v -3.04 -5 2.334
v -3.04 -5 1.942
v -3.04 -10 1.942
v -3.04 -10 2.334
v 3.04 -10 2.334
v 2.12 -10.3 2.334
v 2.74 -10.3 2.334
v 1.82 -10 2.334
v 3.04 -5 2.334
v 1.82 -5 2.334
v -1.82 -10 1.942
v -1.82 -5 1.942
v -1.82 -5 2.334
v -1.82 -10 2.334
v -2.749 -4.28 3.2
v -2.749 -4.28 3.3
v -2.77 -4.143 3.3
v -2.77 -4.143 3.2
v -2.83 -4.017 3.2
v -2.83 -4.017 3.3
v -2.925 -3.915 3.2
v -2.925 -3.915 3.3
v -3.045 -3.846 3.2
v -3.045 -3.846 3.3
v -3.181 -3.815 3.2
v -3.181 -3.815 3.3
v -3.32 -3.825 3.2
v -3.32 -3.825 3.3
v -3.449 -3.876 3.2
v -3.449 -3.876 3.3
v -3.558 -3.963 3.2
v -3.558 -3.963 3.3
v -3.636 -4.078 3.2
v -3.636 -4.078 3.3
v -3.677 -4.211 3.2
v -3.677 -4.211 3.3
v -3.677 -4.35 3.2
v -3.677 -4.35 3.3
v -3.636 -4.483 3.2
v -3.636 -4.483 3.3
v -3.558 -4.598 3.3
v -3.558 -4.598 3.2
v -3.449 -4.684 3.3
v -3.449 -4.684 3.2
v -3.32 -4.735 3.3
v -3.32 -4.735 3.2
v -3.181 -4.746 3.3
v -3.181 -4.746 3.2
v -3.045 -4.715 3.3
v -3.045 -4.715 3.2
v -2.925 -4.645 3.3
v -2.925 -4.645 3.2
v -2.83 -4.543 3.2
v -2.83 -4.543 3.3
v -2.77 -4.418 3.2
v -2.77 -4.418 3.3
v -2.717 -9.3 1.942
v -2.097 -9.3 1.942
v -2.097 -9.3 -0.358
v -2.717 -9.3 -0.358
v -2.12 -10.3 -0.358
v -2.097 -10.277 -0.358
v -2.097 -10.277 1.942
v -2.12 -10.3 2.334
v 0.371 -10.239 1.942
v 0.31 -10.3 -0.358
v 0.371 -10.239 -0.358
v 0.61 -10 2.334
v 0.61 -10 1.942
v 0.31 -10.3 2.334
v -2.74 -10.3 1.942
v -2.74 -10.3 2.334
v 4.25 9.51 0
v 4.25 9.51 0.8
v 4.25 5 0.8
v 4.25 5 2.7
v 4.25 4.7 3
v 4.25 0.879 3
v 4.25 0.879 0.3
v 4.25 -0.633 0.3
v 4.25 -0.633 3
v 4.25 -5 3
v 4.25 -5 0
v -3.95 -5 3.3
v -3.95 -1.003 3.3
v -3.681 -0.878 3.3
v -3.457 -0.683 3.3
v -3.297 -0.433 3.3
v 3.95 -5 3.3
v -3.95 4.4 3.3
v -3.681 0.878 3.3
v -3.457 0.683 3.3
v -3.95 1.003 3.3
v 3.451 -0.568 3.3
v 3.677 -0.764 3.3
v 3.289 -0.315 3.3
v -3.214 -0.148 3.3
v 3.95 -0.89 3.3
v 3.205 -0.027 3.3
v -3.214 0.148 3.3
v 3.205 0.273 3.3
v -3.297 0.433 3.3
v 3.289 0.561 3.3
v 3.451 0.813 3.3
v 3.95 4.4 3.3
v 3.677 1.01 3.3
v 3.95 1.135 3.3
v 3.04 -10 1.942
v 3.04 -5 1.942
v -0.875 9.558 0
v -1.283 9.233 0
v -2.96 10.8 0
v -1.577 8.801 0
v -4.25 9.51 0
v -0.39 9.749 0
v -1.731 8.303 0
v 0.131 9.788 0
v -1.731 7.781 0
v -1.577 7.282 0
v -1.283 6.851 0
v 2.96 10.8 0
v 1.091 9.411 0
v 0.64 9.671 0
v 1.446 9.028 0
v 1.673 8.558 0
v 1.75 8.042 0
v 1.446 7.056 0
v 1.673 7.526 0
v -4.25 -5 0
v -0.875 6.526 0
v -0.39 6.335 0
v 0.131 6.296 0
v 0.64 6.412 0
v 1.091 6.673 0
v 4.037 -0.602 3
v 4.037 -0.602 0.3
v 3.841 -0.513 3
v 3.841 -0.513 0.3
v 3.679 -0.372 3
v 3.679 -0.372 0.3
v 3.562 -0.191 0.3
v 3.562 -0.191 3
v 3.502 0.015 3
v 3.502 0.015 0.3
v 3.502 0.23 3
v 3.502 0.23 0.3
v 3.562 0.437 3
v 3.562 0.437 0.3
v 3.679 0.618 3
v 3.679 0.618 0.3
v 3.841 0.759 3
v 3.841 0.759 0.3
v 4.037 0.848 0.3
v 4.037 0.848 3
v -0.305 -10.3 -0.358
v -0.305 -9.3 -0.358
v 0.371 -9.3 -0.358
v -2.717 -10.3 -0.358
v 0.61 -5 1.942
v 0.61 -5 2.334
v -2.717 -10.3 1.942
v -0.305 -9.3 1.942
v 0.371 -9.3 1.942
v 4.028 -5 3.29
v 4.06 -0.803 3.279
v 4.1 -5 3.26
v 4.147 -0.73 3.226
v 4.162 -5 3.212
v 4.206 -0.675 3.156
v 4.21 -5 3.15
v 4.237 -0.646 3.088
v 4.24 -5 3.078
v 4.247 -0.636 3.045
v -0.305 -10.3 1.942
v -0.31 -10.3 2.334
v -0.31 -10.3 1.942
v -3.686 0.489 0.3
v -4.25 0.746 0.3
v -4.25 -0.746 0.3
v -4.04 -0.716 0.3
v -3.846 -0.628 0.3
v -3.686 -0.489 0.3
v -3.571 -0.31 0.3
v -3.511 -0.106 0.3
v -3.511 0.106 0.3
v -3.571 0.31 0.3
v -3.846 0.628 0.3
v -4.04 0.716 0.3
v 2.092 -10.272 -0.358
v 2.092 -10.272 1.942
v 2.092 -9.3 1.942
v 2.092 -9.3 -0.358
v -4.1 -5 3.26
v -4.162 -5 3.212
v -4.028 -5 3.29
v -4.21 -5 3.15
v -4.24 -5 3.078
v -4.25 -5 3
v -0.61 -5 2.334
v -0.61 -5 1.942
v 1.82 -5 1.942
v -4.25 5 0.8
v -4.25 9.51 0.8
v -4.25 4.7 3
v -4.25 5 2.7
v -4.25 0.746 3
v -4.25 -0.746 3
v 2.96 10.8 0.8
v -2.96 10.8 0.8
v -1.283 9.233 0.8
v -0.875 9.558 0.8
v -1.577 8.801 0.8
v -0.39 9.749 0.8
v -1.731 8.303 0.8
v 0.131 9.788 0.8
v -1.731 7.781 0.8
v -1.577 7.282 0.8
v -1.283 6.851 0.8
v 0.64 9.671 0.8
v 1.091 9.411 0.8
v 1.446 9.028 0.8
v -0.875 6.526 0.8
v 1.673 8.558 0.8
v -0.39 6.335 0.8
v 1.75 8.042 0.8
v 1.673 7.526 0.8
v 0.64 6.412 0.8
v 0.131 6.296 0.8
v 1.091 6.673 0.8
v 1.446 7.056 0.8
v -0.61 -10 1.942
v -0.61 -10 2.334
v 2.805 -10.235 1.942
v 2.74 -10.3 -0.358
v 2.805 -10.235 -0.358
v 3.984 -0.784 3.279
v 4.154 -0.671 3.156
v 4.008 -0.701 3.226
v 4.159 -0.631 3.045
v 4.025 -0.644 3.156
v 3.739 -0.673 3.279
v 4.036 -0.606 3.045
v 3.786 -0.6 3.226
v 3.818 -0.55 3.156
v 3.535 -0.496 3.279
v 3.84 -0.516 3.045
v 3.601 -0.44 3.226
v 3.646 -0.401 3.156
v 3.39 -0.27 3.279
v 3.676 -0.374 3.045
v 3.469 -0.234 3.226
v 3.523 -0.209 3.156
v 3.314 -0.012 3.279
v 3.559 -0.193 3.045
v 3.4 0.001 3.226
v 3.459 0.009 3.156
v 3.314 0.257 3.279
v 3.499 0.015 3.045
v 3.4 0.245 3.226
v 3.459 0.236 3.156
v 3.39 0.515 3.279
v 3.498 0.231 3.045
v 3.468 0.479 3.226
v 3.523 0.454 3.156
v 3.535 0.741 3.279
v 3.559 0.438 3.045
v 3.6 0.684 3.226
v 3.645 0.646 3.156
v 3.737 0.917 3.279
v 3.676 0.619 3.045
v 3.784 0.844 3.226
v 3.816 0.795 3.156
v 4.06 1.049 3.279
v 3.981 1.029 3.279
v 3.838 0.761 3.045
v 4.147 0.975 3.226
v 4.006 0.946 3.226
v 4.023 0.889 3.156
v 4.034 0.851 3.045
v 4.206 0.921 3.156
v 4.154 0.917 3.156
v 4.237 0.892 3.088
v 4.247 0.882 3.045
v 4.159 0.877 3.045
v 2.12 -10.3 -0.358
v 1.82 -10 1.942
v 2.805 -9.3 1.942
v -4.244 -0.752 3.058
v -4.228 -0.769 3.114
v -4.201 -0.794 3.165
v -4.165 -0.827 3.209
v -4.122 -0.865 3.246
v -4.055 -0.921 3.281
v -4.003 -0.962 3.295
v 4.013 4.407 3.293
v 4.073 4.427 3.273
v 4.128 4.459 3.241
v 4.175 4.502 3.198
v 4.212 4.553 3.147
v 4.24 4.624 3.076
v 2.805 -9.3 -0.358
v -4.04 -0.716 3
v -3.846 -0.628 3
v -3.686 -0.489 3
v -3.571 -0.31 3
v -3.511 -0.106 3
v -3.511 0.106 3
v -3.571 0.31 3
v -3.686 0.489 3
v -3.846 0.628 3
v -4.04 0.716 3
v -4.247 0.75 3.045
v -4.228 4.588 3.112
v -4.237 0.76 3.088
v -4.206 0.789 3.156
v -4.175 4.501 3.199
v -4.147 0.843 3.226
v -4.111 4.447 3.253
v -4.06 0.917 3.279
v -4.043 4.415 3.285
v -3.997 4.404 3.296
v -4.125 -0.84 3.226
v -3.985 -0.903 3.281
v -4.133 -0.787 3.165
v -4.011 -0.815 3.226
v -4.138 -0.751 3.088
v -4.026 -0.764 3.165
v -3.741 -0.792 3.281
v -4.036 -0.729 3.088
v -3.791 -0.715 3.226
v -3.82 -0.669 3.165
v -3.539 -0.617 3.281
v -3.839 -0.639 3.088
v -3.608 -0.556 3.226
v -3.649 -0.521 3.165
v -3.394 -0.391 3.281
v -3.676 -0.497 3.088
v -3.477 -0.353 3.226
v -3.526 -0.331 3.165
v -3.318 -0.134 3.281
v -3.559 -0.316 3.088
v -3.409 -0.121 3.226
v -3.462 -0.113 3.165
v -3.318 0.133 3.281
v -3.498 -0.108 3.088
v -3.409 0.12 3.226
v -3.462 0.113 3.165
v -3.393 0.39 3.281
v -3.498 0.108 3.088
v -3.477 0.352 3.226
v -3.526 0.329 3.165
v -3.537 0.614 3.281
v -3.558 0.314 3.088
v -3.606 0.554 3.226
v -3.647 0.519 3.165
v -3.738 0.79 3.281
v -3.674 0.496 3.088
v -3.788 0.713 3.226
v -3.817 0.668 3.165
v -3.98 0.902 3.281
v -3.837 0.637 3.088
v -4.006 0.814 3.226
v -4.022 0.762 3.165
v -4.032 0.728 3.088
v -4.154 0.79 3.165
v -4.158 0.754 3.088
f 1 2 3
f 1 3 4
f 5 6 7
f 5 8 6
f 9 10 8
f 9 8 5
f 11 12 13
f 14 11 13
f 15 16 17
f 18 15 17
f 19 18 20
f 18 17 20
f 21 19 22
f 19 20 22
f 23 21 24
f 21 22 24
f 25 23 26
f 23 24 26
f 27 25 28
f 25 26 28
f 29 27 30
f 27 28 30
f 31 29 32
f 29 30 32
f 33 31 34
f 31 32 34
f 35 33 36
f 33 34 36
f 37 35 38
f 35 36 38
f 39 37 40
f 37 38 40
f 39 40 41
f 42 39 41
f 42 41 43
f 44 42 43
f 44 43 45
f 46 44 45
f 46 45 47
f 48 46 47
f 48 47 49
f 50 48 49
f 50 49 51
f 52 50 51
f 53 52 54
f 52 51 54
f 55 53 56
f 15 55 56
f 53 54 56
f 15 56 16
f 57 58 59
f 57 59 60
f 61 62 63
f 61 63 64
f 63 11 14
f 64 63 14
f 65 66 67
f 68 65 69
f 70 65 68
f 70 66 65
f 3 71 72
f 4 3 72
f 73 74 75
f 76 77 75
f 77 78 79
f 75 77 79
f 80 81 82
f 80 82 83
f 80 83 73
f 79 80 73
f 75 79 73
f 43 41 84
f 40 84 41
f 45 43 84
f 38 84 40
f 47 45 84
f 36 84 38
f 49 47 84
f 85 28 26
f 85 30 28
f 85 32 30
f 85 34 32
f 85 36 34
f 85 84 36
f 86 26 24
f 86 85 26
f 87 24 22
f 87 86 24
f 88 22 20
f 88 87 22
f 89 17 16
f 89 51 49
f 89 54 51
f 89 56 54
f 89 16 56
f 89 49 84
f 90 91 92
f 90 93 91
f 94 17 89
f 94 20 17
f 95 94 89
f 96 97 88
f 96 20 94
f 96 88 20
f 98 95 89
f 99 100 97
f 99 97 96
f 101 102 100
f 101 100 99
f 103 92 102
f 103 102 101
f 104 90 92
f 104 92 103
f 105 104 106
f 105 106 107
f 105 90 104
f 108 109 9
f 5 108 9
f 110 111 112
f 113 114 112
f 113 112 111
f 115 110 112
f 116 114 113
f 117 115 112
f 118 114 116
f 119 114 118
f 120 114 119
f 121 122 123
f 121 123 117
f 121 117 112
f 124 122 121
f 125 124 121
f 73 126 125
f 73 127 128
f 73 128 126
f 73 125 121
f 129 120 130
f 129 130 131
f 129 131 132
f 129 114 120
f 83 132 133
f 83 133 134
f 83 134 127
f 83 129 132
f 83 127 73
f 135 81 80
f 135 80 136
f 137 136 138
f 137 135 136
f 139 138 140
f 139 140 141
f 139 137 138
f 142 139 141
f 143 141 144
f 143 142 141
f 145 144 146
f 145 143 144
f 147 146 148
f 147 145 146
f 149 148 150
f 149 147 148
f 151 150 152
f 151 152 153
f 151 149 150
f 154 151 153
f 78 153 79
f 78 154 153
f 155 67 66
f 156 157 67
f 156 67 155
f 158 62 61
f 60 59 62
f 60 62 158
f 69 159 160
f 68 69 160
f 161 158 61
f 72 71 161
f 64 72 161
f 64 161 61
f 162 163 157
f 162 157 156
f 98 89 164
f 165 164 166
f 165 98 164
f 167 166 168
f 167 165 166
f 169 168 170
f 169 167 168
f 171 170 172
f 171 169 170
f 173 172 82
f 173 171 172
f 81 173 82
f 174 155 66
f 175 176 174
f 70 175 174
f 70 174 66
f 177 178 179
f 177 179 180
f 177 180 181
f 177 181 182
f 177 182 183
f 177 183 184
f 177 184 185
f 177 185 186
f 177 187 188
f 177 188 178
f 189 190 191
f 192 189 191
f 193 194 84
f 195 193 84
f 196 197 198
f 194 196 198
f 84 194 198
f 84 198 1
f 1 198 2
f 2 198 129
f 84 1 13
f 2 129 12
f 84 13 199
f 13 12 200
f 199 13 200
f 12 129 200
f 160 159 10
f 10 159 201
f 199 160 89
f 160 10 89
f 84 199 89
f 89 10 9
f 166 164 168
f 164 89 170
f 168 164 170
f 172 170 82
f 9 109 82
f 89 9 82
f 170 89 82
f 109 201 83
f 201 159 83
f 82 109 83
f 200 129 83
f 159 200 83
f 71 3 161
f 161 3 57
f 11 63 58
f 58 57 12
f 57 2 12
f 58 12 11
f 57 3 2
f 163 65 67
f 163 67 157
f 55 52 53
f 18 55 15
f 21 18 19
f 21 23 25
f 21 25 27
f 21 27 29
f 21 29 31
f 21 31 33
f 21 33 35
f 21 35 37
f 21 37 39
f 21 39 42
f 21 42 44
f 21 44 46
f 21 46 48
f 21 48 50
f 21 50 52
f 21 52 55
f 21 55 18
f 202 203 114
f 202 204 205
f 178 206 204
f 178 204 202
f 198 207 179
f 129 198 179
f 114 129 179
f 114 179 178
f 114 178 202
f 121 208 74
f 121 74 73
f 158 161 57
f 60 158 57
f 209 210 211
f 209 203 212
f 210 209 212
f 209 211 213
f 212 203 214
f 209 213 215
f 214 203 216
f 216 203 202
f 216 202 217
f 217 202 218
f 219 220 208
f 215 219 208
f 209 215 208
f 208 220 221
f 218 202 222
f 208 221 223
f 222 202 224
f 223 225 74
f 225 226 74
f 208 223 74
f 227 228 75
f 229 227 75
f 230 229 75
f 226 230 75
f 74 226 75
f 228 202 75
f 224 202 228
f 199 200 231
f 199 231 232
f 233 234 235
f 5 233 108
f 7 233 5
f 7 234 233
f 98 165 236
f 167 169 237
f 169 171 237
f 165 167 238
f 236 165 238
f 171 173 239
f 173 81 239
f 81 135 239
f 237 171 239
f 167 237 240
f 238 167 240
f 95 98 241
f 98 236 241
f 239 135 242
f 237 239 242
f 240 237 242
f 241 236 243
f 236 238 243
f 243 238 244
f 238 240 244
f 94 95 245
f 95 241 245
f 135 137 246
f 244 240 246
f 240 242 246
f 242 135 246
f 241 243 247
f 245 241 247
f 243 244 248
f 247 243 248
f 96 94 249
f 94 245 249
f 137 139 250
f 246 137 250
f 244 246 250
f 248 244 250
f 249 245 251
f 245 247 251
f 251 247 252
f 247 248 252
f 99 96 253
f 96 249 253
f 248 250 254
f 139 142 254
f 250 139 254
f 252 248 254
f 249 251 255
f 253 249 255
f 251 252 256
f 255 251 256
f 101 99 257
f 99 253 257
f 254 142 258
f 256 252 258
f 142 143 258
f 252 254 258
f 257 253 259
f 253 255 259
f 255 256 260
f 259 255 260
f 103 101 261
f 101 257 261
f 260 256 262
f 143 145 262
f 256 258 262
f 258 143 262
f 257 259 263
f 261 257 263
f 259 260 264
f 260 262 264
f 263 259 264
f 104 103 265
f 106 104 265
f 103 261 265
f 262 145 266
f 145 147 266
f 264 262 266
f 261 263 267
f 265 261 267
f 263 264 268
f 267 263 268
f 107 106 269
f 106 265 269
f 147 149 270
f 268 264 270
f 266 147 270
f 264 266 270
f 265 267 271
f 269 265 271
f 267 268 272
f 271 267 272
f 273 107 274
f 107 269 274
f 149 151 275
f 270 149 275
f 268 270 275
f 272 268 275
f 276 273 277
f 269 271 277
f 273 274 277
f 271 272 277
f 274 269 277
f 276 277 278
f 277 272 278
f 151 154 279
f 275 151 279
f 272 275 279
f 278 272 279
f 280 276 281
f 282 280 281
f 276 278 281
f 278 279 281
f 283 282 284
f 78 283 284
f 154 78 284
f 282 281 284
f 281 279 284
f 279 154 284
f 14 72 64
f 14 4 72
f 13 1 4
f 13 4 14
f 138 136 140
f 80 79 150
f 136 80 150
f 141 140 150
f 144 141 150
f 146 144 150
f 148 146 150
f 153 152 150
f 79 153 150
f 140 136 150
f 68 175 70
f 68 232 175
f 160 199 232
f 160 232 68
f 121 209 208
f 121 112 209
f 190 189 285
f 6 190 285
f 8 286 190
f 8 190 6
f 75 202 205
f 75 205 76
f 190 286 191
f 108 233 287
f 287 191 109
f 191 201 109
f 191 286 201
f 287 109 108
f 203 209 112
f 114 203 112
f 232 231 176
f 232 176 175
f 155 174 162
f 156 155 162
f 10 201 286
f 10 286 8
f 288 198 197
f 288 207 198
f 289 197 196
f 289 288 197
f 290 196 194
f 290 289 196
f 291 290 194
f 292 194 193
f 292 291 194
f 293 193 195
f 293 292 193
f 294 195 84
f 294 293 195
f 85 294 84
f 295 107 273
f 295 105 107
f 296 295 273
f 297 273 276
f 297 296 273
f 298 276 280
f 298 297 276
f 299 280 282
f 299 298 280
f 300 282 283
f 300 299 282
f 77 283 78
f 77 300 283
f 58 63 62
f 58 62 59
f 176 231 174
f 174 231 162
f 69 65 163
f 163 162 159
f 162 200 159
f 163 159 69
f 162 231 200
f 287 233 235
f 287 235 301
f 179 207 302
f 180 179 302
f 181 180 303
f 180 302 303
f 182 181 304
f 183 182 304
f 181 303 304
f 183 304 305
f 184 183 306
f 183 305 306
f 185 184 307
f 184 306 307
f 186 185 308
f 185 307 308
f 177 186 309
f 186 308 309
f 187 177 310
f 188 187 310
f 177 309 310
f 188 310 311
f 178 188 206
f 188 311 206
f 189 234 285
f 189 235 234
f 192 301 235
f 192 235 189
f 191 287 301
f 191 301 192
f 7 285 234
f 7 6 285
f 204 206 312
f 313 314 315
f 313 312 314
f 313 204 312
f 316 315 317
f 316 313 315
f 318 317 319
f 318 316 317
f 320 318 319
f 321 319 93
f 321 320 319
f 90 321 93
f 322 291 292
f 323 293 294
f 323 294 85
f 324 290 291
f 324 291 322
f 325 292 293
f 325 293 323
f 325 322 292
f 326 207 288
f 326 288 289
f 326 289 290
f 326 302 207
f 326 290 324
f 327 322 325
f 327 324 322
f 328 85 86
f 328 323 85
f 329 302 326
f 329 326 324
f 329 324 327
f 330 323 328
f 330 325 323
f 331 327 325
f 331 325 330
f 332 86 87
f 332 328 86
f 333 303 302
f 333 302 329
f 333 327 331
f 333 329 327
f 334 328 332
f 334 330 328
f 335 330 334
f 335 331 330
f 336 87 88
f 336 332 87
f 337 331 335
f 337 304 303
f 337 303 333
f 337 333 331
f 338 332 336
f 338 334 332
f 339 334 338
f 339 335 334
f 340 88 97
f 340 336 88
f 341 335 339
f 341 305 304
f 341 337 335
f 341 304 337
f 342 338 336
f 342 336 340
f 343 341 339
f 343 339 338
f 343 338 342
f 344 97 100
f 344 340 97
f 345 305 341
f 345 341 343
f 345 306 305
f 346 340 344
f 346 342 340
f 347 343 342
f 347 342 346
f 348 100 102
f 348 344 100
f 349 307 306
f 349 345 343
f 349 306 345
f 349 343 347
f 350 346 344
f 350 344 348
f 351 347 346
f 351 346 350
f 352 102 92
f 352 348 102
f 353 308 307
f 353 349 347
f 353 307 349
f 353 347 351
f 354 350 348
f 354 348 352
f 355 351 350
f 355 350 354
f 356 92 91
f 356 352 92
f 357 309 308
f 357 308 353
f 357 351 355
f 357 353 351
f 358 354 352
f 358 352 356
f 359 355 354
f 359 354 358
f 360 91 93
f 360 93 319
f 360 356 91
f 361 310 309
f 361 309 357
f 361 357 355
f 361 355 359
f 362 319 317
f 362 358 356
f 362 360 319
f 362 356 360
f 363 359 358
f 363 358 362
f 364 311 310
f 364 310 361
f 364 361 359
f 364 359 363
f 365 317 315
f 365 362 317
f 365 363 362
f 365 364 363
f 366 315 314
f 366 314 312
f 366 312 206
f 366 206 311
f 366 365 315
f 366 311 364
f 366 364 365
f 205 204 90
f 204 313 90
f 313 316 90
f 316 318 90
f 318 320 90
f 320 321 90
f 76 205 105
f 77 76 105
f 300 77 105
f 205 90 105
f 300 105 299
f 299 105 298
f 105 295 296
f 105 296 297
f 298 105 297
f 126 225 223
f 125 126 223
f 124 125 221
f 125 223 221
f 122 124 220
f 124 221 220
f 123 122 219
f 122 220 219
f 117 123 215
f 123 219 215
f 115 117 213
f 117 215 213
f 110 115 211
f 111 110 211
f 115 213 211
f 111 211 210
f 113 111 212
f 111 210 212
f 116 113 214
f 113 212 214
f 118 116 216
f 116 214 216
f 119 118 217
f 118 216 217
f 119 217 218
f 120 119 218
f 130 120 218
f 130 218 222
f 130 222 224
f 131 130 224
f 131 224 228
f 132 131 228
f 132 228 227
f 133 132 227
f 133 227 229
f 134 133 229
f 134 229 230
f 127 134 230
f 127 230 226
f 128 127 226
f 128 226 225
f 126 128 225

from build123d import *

# Parameters (mm, degrees)
CROQUIS1_W              = 8.5
CROQUIS1_H              = 10
SALIENTE_EXTRUIR1_DEPTH = 3.3
CROQUIS2_R              = 0.466725864
CORTAR_EXTRUIR1_DEPTH   = 0.1
CORTAR_EXTRUIR2_DEPTH   = 3
CORTAR_EXTRUIR3_DEPTH   = 3
CHAFL_N1_SIZE           = 0.6
REDONDEO1_R             = 0.3
CROQUIS5_W              = 8.5
CROQUIS5_H              = 0.8
SALIENTE_EXTRUIR2_DEPTH = 5.8
CROQUIS6_R              = 1.750484279
CORTAR_EXTRUIR4_DEPTH   = 5.8
CROQUIS7_W              = 1.22
CROQUIS7_H              = 0.3917794
SALIENTE_EXTRUIR3_DEPTH = 5.3
CROQUIS8_W              = 1.22
CROQUIS8_H              = 0.3917794
SALIENTE_EXTRUIR4_DEPTH = 5.3
CROQUIS9_W              = 0.675717965
CROQUIS9_H              = 1
CROQUIS9_W_2            = 0.619737604
CROQUIS9_W_3            = 0.713804918
SALIENTE_EXTRUIR5_DEPTH = 2.3
CHAFL_N2_SIZE           = 0.3
CHAFL_N3_SIZE           = 0.3
CHAFL_N4_SIZE           = 0.3
CHAFL_N5_SIZE           = 0.3
CHAFL_N6_SIZE           = 0.3
CHAFL_N7_SIZE           = 0.3
CHAFL_N8_SIZE           = 1.29
CHAFL_N9_SIZE           = 1.29


with BuildPart() as part:
    # Croquis1 → Saliente-Extruir1 (new body)
    with BuildSketch(Plane.XY):
        Rectangle(CROQUIS1_W, CROQUIS1_H)
    extrude(amount=SALIENTE_EXTRUIR1_DEPTH)

    # Croquis2 → Cortar-Extruir1 (cut)
    with BuildSketch(Plane.XY.offset(3.3)):
        with Locations((-3.215855375, -4.280210789)):
            Circle(CROQUIS2_R)
    extrude(amount=-CORTAR_EXTRUIR1_DEPTH, mode=Mode.SUBTRACT)

    # Croquis3 → Cortar-Extruir2 (cut)
    with BuildSketch(Plane.XY.offset(3.3)):
        with BuildLine():
            Line((-4.25, 0.746438526), (-4.25, -0.746438526))
            ThreePointArc((-4.25, -0.746438526), (-3.503561474, 0), (-4.25, 0.746438526))
        make_face()
    extrude(amount=-CORTAR_EXTRUIR2_DEPTH, mode=Mode.SUBTRACT)

    # Croquis4 → Cortar-Extruir3 (cut)
    with BuildSketch(Plane.XY.offset(3.3)):
        with BuildLine():
            Line((4.25, 0.878718771), (4.25, -0.633055459))
            ThreePointArc((4.25, -0.633055459), (3.494112885, 0.122831656), (4.25, 0.878718771))
        make_face()
    extrude(amount=-CORTAR_EXTRUIR3_DEPTH, mode=Mode.SUBTRACT)

    # Chaflán1
    chafl_n1_edges = [part.edges().sort_by_distance(p)[0] for p in [
        (0, 5, 3.3),
    ]]
    chamfer(chafl_n1_edges, length=CHAFL_N1_SIZE)

    # Redondeo1
    redondeo1_edges = [part.edges().sort_by_distance(p)[0] for p in [
        (4.25, -2.816527729, 3.3),
        (-4.25, -2.873219263, 3.3),
        (-3.503561474, 0, 3.3),
        (4.25, 2.639359386, 3.3),
        (3.494112885, 0.122831656, 3.3),
        (-4.25, 2.573219263, 3.3),
    ]]
    fillet(redondeo1_edges, radius=REDONDEO1_R)

    # Croquis5 → Saliente-Extruir2 (add)
    with BuildSketch(Plane(origin=(0, 5, 0), x_dir=(1, 0, 0), z_dir=(0, 1, 0))):
        with Locations((0, -0.4)):
            Rectangle(CROQUIS5_W, CROQUIS5_H)
    extrude(amount=SALIENTE_EXTRUIR2_DEPTH)

    # Croquis6 → Cortar-Extruir4 (cut)
    with BuildSketch(Plane.XY.offset(0.8)):
        with Locations((0, 8.041970686)):
            Circle(CROQUIS6_R)
    extrude(amount=-CORTAR_EXTRUIR4_DEPTH, mode=Mode.SUBTRACT)

    # Croquis7 → Saliente-Extruir3 (add)
    with BuildSketch(Plane.XZ.offset(5)):
        with Locations((0, 2.138324213)):
            Rectangle(CROQUIS7_W, CROQUIS7_H)
    extrude(amount=SALIENTE_EXTRUIR3_DEPTH)

    # Croquis8 → Saliente-Extruir4 (add)
    with BuildSketch(Plane.XZ.offset(5)):
        with Locations((2.43, 2.138324213)):
            Rectangle(CROQUIS8_W, CROQUIS8_H)
        with Locations((-2.43, 2.138324213)):
            Rectangle(CROQUIS8_W, CROQUIS8_H)
    extrude(amount=SALIENTE_EXTRUIR4_DEPTH)

    # Croquis9 → Saliente-Extruir5 (add)
    with BuildSketch(Plane(origin=(0, 0, 1.942434513), x_dir=(-1, 0, 0), z_dir=(0, 0, -1))):
        with Locations((-0.032858983, -9.8)):
            Rectangle(CROQUIS9_W, CROQUIS9_H)
        with Locations((2.407034508, -9.8)):
            Rectangle(CROQUIS9_W_2, CROQUIS9_H)
        with Locations((-2.448498949, -9.8)):
            Rectangle(CROQUIS9_W_3, CROQUIS9_H)
    extrude(amount=SALIENTE_EXTRUIR5_DEPTH)

    # Chaflán2
    chafl_n2_edges = [part.edges().sort_by_distance(p)[0] for p in [
        (3.04, -10.3, 2.138324213),
    ]]
    chamfer(chafl_n2_edges, length=CHAFL_N2_SIZE)

    # Chaflán3
    chafl_n3_edges = [part.edges().sort_by_distance(p)[0] for p in [
        (1.82, -10.3, 2.138324213),
    ]]
    chamfer(chafl_n3_edges, length=CHAFL_N3_SIZE)

    # Chaflán4
    chafl_n4_edges = [part.edges().sort_by_distance(p)[0] for p in [
        (-0.61, -10.3, 2.138324213),
    ]]
    chamfer(chafl_n4_edges, length=CHAFL_N4_SIZE)

    # Chaflán5
    chafl_n5_edges = [part.edges().sort_by_distance(p)[0] for p in [
        (-3.04, -10.3, 2.138324213),
    ]]
    chamfer(chafl_n5_edges, length=CHAFL_N5_SIZE)

    # Chaflán6
    chafl_n6_edges = [part.edges().sort_by_distance(p)[0] for p in [
        (-1.82, -10.3, 2.138324213),
    ]]
    chamfer(chafl_n6_edges, length=CHAFL_N6_SIZE)

    # Chaflán7
    chafl_n7_edges = [part.edges().sort_by_distance(p)[0] for p in [
        (0.61, -10.3, 2.138324213),
    ]]
    chamfer(chafl_n7_edges, length=CHAFL_N7_SIZE)

    # Chaflán8
    chafl_n8_edges = [part.edges().sort_by_distance(p)[0] for p in [
        (4.25, 10.8, 0.4),
    ]]
    chamfer(chafl_n8_edges, length=CHAFL_N8_SIZE)

    # Chaflán9
    chafl_n9_edges = [part.edges().sort_by_distance(p)[0] for p in [
        (-4.25, 10.8, 0.4),
    ]]
    chamfer(chafl_n9_edges, length=CHAFL_N9_SIZE)


solid = part.part
